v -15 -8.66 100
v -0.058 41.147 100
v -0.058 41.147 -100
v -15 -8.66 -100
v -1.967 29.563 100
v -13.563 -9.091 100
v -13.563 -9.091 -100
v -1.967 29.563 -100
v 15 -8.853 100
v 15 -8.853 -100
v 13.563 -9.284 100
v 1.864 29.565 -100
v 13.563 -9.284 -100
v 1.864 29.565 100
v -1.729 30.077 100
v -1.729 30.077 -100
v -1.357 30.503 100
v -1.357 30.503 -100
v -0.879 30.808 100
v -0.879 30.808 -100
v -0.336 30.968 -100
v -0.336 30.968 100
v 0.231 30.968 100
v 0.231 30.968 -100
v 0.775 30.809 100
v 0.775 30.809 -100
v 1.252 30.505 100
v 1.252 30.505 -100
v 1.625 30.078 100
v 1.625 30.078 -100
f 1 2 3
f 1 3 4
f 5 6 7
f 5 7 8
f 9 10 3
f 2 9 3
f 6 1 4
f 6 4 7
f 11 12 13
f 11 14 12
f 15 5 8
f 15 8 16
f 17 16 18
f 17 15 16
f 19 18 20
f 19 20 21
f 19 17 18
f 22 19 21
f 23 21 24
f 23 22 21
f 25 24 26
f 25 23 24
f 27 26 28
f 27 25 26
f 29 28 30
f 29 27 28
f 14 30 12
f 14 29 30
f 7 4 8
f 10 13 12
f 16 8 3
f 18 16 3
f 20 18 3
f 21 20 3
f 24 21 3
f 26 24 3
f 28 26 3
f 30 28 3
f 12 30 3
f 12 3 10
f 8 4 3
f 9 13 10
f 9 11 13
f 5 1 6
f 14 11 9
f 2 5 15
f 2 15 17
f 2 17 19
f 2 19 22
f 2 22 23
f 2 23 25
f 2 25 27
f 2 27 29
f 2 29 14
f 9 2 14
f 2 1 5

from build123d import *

# Parameters (mm, degrees)
F1_DEPTH = 100


with BuildPart() as f1:
    # F0 (on Top) → F1 (new body, symmetric)
    with BuildSketch(Plane.XY):
        with BuildLine():
            Line((15, -8.853287), (-0.05791, 41.146713))
            Line((-0.05791, 41.146713), (-15, -8.660254))
            Line((-15, -8.660254), (-13.563261, -9.091276))
            Line((-13.563261, -9.091276), (-1.967105, 29.562577))
            ThreePointArc((-1.967105, 29.562577), (-0.052514, 30.987881), (1.863589, 29.564611))
            Line((1.863589, 29.564611), (13.56326, -9.284309))
            Line((13.56326, -9.284309), (15, -8.853287))
        make_face()
    extrude(amount=F1_DEPTH, both=True)


solid = f1.part
